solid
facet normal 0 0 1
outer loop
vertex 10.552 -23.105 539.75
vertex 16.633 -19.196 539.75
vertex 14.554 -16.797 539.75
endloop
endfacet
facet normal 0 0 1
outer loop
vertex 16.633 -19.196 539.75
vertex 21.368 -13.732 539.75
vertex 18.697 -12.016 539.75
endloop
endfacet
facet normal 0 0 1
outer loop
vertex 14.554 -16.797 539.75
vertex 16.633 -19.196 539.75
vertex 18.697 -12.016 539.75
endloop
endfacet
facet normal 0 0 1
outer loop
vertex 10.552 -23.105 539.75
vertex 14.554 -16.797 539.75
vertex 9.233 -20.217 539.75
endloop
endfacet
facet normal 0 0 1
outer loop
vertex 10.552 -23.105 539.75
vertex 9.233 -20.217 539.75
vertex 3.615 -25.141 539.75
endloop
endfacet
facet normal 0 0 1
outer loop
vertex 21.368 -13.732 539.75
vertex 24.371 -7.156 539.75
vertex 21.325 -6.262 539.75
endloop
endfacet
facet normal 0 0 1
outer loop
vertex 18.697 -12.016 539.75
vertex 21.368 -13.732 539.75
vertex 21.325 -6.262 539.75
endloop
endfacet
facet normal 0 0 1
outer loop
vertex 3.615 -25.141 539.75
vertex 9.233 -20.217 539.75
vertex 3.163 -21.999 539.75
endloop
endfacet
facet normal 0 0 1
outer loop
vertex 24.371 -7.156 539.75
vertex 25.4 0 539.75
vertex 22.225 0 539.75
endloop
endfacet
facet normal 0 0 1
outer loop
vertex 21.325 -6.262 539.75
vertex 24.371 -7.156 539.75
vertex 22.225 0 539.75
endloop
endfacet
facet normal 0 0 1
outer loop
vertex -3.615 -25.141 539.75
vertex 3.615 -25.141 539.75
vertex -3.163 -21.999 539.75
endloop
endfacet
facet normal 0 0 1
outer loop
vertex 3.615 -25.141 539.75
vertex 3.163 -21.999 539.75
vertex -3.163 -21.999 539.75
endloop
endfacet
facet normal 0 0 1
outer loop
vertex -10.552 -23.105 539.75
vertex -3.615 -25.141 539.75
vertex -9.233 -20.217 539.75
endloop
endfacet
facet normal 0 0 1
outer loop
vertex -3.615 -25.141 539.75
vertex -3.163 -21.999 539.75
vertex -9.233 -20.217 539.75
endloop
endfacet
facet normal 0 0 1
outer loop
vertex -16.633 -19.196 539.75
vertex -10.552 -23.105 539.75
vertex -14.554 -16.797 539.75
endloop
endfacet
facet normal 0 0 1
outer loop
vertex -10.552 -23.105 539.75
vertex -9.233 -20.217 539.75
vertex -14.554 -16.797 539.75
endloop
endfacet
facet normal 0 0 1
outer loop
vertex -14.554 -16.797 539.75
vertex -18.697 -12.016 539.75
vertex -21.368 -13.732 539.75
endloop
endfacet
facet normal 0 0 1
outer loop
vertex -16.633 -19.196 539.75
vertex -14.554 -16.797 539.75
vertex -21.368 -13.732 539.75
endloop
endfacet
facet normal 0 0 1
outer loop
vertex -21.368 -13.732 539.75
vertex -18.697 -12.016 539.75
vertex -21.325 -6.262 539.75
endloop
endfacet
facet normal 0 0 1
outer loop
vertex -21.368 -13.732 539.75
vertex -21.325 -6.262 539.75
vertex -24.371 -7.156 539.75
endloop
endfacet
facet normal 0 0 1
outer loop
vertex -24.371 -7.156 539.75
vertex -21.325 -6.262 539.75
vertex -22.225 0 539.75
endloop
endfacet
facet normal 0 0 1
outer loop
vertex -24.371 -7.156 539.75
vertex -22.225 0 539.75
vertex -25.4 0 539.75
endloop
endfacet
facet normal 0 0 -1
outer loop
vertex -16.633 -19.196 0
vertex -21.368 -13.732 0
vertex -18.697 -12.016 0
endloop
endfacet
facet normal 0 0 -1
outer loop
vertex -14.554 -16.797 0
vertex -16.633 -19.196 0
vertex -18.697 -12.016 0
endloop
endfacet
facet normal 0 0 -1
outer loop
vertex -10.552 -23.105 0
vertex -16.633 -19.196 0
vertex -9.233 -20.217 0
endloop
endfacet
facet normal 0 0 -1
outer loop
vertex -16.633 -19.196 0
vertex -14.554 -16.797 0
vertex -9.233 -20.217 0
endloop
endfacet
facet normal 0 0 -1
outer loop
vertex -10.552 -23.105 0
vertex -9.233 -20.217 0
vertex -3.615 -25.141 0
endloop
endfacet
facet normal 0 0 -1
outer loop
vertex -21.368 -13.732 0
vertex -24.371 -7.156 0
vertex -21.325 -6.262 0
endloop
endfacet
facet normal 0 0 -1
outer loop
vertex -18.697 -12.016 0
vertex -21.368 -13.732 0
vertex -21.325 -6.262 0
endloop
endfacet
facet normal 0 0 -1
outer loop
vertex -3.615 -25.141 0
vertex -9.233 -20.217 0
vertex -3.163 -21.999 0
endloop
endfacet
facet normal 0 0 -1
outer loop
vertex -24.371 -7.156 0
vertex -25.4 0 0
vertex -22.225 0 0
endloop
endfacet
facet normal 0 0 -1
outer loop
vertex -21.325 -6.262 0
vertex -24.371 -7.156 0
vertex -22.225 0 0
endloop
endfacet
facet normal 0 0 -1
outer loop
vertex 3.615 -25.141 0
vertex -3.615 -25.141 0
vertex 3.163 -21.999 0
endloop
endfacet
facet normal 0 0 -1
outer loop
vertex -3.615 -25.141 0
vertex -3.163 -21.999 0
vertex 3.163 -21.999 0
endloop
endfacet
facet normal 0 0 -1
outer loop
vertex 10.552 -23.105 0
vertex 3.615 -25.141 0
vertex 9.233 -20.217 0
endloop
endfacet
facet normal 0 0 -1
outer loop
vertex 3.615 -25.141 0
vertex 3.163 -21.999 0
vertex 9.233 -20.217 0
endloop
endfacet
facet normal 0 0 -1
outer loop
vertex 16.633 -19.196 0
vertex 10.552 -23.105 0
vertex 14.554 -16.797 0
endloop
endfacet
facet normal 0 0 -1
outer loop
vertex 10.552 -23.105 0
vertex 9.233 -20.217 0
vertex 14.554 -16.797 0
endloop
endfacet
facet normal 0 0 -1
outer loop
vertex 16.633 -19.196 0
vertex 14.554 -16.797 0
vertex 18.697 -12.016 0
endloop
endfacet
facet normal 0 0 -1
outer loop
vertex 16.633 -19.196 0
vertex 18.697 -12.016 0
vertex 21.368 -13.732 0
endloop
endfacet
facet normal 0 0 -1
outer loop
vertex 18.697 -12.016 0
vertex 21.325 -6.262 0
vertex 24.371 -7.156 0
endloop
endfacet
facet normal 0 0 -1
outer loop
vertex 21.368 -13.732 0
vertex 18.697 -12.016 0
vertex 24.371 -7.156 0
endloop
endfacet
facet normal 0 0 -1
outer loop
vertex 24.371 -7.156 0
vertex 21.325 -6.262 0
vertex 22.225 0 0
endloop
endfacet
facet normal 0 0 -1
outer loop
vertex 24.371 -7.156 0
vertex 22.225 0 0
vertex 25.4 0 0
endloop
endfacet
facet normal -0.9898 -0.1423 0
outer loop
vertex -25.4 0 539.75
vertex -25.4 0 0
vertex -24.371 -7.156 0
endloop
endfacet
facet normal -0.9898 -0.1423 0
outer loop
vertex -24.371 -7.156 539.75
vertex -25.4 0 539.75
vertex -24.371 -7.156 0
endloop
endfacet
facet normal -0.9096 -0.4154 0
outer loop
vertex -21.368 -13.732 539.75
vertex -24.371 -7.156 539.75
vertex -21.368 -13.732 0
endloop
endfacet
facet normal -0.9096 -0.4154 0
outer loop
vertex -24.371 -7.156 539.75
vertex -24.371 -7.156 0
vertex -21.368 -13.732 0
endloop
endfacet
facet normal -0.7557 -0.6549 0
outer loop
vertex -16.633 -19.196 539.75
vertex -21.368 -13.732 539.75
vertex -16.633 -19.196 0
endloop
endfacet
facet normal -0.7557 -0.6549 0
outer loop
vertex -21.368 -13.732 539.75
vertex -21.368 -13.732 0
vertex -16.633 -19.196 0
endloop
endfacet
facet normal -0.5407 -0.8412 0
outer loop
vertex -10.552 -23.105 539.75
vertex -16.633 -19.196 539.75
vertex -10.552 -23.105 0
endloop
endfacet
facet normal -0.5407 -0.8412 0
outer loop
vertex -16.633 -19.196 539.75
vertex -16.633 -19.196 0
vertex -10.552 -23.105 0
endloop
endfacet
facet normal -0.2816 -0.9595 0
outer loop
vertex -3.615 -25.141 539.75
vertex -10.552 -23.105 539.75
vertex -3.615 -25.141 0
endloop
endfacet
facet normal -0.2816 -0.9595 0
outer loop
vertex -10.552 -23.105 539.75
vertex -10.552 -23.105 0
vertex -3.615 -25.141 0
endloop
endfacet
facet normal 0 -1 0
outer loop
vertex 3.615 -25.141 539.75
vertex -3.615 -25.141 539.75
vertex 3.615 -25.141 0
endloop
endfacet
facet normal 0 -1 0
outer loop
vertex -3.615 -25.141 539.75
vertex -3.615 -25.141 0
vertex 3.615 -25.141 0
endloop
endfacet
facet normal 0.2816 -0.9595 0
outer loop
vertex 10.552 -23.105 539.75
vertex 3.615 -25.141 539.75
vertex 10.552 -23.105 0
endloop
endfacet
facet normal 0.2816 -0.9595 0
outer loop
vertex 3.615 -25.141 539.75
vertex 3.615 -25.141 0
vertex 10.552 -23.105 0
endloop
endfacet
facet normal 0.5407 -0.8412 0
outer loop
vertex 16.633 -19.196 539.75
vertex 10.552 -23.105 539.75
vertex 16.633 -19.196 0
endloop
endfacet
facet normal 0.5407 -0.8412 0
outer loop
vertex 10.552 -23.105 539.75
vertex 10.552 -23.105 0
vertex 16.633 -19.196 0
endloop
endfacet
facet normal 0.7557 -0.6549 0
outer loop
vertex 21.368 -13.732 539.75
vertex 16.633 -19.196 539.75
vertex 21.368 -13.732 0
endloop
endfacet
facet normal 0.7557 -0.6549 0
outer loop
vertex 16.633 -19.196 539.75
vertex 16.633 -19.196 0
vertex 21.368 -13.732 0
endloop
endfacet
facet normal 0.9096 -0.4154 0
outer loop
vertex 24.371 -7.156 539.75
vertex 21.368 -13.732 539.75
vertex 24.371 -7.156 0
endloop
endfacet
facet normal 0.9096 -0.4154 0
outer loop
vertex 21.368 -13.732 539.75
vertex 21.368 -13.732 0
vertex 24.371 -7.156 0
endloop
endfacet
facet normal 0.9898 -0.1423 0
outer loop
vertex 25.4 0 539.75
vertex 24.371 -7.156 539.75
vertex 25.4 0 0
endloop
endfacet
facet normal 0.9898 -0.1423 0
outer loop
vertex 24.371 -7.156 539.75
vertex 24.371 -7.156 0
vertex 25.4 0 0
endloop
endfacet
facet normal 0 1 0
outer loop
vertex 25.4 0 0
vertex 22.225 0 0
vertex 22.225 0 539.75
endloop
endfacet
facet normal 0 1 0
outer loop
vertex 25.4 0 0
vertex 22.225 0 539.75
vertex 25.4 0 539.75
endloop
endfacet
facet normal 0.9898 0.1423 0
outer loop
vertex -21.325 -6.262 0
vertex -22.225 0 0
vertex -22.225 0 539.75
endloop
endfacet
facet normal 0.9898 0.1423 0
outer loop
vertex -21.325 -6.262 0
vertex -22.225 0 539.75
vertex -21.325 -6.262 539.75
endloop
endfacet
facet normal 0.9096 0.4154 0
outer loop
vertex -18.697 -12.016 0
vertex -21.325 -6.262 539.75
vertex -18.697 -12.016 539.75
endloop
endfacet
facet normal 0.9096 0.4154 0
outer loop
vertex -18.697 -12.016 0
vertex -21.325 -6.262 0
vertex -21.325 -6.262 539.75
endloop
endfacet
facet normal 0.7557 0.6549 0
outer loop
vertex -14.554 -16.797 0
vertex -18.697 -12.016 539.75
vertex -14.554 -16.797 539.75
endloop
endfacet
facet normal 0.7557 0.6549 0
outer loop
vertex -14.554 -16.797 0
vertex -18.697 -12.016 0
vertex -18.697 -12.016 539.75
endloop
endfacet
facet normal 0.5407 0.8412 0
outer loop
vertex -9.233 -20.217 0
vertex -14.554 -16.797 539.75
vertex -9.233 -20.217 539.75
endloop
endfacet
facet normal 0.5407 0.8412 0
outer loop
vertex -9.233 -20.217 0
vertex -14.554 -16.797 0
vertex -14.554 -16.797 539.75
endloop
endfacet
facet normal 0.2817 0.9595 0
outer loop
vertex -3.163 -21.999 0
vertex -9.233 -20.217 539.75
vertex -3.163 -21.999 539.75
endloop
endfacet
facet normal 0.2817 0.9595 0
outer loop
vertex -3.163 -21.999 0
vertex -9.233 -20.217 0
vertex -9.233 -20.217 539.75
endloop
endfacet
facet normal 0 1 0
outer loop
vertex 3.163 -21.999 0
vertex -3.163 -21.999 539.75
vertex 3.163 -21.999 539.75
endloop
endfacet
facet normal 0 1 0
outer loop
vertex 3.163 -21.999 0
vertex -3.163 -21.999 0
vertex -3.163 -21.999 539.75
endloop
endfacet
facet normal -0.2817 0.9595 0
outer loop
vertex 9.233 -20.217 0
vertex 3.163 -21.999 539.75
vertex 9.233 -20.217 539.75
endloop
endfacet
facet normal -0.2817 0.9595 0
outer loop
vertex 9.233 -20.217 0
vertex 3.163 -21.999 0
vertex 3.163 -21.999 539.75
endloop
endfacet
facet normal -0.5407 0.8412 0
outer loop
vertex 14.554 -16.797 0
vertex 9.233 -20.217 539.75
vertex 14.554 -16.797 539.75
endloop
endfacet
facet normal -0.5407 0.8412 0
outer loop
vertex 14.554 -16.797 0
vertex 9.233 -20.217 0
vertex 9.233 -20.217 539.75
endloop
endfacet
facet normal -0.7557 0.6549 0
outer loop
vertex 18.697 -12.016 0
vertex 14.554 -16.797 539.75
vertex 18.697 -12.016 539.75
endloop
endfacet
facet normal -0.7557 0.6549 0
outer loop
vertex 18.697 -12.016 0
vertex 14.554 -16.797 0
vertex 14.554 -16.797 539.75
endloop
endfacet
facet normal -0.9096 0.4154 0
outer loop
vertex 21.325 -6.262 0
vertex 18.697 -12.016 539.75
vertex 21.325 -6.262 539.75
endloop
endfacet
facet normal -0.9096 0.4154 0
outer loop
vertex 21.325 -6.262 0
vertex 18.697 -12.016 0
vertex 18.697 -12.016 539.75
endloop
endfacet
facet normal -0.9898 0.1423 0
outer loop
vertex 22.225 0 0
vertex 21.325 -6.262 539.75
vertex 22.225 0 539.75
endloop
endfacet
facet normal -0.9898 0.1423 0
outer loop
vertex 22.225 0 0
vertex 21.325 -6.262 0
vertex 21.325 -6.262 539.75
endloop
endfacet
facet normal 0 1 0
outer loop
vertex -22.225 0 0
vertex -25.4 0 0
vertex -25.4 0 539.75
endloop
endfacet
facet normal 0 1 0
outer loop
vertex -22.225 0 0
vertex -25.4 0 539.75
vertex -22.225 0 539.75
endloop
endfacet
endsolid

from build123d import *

# Parameters (mm, degrees)
SKETCH1_R           = 25.4
SKETCH1_R_2         = 22.225
BOSS_EXTRUDE1_DEPTH = 914.4
CUT_EXTRUDE1_START  = -539.75
SKETCH2_R           = 25.4
CUT_EXTRUDE1_DEPTH  = 376.35528356
CUT_EXTRUDE3_DEPTH  = 541.943973531


with BuildPart() as part:
    # Sketch1 → Boss-Extrude1 (new body)
    with BuildSketch(Plane.XY):
        Circle(SKETCH1_R)
        Circle(SKETCH1_R_2, mode=Mode.SUBTRACT)
    extrude(amount=BOSS_EXTRUDE1_DEPTH)

    # Sketch2 → Cut-Extrude1 (cut, through all)
    with BuildSketch(Plane(origin=(0, 0, 0), x_dir=(-1, 0, 0), z_dir=(0, 0, -1)).offset(CUT_EXTRUDE1_START)):
        Circle(SKETCH2_R)
    extrude(amount=-CUT_EXTRUDE1_DEPTH, mode=Mode.SUBTRACT)

    # Sketch4 → Cut-Extrude3 (cut, through all)
    with BuildSketch(Plane.XY):
        with BuildLine():
            Line((-25.4, 0), (25.4, 0))
            ThreePointArc((25.4, 0), (0, 25.4), (-25.4, 0))
        make_face()
    extrude(amount=CUT_EXTRUDE3_DEPTH, mode=Mode.SUBTRACT)


solid = part.part
